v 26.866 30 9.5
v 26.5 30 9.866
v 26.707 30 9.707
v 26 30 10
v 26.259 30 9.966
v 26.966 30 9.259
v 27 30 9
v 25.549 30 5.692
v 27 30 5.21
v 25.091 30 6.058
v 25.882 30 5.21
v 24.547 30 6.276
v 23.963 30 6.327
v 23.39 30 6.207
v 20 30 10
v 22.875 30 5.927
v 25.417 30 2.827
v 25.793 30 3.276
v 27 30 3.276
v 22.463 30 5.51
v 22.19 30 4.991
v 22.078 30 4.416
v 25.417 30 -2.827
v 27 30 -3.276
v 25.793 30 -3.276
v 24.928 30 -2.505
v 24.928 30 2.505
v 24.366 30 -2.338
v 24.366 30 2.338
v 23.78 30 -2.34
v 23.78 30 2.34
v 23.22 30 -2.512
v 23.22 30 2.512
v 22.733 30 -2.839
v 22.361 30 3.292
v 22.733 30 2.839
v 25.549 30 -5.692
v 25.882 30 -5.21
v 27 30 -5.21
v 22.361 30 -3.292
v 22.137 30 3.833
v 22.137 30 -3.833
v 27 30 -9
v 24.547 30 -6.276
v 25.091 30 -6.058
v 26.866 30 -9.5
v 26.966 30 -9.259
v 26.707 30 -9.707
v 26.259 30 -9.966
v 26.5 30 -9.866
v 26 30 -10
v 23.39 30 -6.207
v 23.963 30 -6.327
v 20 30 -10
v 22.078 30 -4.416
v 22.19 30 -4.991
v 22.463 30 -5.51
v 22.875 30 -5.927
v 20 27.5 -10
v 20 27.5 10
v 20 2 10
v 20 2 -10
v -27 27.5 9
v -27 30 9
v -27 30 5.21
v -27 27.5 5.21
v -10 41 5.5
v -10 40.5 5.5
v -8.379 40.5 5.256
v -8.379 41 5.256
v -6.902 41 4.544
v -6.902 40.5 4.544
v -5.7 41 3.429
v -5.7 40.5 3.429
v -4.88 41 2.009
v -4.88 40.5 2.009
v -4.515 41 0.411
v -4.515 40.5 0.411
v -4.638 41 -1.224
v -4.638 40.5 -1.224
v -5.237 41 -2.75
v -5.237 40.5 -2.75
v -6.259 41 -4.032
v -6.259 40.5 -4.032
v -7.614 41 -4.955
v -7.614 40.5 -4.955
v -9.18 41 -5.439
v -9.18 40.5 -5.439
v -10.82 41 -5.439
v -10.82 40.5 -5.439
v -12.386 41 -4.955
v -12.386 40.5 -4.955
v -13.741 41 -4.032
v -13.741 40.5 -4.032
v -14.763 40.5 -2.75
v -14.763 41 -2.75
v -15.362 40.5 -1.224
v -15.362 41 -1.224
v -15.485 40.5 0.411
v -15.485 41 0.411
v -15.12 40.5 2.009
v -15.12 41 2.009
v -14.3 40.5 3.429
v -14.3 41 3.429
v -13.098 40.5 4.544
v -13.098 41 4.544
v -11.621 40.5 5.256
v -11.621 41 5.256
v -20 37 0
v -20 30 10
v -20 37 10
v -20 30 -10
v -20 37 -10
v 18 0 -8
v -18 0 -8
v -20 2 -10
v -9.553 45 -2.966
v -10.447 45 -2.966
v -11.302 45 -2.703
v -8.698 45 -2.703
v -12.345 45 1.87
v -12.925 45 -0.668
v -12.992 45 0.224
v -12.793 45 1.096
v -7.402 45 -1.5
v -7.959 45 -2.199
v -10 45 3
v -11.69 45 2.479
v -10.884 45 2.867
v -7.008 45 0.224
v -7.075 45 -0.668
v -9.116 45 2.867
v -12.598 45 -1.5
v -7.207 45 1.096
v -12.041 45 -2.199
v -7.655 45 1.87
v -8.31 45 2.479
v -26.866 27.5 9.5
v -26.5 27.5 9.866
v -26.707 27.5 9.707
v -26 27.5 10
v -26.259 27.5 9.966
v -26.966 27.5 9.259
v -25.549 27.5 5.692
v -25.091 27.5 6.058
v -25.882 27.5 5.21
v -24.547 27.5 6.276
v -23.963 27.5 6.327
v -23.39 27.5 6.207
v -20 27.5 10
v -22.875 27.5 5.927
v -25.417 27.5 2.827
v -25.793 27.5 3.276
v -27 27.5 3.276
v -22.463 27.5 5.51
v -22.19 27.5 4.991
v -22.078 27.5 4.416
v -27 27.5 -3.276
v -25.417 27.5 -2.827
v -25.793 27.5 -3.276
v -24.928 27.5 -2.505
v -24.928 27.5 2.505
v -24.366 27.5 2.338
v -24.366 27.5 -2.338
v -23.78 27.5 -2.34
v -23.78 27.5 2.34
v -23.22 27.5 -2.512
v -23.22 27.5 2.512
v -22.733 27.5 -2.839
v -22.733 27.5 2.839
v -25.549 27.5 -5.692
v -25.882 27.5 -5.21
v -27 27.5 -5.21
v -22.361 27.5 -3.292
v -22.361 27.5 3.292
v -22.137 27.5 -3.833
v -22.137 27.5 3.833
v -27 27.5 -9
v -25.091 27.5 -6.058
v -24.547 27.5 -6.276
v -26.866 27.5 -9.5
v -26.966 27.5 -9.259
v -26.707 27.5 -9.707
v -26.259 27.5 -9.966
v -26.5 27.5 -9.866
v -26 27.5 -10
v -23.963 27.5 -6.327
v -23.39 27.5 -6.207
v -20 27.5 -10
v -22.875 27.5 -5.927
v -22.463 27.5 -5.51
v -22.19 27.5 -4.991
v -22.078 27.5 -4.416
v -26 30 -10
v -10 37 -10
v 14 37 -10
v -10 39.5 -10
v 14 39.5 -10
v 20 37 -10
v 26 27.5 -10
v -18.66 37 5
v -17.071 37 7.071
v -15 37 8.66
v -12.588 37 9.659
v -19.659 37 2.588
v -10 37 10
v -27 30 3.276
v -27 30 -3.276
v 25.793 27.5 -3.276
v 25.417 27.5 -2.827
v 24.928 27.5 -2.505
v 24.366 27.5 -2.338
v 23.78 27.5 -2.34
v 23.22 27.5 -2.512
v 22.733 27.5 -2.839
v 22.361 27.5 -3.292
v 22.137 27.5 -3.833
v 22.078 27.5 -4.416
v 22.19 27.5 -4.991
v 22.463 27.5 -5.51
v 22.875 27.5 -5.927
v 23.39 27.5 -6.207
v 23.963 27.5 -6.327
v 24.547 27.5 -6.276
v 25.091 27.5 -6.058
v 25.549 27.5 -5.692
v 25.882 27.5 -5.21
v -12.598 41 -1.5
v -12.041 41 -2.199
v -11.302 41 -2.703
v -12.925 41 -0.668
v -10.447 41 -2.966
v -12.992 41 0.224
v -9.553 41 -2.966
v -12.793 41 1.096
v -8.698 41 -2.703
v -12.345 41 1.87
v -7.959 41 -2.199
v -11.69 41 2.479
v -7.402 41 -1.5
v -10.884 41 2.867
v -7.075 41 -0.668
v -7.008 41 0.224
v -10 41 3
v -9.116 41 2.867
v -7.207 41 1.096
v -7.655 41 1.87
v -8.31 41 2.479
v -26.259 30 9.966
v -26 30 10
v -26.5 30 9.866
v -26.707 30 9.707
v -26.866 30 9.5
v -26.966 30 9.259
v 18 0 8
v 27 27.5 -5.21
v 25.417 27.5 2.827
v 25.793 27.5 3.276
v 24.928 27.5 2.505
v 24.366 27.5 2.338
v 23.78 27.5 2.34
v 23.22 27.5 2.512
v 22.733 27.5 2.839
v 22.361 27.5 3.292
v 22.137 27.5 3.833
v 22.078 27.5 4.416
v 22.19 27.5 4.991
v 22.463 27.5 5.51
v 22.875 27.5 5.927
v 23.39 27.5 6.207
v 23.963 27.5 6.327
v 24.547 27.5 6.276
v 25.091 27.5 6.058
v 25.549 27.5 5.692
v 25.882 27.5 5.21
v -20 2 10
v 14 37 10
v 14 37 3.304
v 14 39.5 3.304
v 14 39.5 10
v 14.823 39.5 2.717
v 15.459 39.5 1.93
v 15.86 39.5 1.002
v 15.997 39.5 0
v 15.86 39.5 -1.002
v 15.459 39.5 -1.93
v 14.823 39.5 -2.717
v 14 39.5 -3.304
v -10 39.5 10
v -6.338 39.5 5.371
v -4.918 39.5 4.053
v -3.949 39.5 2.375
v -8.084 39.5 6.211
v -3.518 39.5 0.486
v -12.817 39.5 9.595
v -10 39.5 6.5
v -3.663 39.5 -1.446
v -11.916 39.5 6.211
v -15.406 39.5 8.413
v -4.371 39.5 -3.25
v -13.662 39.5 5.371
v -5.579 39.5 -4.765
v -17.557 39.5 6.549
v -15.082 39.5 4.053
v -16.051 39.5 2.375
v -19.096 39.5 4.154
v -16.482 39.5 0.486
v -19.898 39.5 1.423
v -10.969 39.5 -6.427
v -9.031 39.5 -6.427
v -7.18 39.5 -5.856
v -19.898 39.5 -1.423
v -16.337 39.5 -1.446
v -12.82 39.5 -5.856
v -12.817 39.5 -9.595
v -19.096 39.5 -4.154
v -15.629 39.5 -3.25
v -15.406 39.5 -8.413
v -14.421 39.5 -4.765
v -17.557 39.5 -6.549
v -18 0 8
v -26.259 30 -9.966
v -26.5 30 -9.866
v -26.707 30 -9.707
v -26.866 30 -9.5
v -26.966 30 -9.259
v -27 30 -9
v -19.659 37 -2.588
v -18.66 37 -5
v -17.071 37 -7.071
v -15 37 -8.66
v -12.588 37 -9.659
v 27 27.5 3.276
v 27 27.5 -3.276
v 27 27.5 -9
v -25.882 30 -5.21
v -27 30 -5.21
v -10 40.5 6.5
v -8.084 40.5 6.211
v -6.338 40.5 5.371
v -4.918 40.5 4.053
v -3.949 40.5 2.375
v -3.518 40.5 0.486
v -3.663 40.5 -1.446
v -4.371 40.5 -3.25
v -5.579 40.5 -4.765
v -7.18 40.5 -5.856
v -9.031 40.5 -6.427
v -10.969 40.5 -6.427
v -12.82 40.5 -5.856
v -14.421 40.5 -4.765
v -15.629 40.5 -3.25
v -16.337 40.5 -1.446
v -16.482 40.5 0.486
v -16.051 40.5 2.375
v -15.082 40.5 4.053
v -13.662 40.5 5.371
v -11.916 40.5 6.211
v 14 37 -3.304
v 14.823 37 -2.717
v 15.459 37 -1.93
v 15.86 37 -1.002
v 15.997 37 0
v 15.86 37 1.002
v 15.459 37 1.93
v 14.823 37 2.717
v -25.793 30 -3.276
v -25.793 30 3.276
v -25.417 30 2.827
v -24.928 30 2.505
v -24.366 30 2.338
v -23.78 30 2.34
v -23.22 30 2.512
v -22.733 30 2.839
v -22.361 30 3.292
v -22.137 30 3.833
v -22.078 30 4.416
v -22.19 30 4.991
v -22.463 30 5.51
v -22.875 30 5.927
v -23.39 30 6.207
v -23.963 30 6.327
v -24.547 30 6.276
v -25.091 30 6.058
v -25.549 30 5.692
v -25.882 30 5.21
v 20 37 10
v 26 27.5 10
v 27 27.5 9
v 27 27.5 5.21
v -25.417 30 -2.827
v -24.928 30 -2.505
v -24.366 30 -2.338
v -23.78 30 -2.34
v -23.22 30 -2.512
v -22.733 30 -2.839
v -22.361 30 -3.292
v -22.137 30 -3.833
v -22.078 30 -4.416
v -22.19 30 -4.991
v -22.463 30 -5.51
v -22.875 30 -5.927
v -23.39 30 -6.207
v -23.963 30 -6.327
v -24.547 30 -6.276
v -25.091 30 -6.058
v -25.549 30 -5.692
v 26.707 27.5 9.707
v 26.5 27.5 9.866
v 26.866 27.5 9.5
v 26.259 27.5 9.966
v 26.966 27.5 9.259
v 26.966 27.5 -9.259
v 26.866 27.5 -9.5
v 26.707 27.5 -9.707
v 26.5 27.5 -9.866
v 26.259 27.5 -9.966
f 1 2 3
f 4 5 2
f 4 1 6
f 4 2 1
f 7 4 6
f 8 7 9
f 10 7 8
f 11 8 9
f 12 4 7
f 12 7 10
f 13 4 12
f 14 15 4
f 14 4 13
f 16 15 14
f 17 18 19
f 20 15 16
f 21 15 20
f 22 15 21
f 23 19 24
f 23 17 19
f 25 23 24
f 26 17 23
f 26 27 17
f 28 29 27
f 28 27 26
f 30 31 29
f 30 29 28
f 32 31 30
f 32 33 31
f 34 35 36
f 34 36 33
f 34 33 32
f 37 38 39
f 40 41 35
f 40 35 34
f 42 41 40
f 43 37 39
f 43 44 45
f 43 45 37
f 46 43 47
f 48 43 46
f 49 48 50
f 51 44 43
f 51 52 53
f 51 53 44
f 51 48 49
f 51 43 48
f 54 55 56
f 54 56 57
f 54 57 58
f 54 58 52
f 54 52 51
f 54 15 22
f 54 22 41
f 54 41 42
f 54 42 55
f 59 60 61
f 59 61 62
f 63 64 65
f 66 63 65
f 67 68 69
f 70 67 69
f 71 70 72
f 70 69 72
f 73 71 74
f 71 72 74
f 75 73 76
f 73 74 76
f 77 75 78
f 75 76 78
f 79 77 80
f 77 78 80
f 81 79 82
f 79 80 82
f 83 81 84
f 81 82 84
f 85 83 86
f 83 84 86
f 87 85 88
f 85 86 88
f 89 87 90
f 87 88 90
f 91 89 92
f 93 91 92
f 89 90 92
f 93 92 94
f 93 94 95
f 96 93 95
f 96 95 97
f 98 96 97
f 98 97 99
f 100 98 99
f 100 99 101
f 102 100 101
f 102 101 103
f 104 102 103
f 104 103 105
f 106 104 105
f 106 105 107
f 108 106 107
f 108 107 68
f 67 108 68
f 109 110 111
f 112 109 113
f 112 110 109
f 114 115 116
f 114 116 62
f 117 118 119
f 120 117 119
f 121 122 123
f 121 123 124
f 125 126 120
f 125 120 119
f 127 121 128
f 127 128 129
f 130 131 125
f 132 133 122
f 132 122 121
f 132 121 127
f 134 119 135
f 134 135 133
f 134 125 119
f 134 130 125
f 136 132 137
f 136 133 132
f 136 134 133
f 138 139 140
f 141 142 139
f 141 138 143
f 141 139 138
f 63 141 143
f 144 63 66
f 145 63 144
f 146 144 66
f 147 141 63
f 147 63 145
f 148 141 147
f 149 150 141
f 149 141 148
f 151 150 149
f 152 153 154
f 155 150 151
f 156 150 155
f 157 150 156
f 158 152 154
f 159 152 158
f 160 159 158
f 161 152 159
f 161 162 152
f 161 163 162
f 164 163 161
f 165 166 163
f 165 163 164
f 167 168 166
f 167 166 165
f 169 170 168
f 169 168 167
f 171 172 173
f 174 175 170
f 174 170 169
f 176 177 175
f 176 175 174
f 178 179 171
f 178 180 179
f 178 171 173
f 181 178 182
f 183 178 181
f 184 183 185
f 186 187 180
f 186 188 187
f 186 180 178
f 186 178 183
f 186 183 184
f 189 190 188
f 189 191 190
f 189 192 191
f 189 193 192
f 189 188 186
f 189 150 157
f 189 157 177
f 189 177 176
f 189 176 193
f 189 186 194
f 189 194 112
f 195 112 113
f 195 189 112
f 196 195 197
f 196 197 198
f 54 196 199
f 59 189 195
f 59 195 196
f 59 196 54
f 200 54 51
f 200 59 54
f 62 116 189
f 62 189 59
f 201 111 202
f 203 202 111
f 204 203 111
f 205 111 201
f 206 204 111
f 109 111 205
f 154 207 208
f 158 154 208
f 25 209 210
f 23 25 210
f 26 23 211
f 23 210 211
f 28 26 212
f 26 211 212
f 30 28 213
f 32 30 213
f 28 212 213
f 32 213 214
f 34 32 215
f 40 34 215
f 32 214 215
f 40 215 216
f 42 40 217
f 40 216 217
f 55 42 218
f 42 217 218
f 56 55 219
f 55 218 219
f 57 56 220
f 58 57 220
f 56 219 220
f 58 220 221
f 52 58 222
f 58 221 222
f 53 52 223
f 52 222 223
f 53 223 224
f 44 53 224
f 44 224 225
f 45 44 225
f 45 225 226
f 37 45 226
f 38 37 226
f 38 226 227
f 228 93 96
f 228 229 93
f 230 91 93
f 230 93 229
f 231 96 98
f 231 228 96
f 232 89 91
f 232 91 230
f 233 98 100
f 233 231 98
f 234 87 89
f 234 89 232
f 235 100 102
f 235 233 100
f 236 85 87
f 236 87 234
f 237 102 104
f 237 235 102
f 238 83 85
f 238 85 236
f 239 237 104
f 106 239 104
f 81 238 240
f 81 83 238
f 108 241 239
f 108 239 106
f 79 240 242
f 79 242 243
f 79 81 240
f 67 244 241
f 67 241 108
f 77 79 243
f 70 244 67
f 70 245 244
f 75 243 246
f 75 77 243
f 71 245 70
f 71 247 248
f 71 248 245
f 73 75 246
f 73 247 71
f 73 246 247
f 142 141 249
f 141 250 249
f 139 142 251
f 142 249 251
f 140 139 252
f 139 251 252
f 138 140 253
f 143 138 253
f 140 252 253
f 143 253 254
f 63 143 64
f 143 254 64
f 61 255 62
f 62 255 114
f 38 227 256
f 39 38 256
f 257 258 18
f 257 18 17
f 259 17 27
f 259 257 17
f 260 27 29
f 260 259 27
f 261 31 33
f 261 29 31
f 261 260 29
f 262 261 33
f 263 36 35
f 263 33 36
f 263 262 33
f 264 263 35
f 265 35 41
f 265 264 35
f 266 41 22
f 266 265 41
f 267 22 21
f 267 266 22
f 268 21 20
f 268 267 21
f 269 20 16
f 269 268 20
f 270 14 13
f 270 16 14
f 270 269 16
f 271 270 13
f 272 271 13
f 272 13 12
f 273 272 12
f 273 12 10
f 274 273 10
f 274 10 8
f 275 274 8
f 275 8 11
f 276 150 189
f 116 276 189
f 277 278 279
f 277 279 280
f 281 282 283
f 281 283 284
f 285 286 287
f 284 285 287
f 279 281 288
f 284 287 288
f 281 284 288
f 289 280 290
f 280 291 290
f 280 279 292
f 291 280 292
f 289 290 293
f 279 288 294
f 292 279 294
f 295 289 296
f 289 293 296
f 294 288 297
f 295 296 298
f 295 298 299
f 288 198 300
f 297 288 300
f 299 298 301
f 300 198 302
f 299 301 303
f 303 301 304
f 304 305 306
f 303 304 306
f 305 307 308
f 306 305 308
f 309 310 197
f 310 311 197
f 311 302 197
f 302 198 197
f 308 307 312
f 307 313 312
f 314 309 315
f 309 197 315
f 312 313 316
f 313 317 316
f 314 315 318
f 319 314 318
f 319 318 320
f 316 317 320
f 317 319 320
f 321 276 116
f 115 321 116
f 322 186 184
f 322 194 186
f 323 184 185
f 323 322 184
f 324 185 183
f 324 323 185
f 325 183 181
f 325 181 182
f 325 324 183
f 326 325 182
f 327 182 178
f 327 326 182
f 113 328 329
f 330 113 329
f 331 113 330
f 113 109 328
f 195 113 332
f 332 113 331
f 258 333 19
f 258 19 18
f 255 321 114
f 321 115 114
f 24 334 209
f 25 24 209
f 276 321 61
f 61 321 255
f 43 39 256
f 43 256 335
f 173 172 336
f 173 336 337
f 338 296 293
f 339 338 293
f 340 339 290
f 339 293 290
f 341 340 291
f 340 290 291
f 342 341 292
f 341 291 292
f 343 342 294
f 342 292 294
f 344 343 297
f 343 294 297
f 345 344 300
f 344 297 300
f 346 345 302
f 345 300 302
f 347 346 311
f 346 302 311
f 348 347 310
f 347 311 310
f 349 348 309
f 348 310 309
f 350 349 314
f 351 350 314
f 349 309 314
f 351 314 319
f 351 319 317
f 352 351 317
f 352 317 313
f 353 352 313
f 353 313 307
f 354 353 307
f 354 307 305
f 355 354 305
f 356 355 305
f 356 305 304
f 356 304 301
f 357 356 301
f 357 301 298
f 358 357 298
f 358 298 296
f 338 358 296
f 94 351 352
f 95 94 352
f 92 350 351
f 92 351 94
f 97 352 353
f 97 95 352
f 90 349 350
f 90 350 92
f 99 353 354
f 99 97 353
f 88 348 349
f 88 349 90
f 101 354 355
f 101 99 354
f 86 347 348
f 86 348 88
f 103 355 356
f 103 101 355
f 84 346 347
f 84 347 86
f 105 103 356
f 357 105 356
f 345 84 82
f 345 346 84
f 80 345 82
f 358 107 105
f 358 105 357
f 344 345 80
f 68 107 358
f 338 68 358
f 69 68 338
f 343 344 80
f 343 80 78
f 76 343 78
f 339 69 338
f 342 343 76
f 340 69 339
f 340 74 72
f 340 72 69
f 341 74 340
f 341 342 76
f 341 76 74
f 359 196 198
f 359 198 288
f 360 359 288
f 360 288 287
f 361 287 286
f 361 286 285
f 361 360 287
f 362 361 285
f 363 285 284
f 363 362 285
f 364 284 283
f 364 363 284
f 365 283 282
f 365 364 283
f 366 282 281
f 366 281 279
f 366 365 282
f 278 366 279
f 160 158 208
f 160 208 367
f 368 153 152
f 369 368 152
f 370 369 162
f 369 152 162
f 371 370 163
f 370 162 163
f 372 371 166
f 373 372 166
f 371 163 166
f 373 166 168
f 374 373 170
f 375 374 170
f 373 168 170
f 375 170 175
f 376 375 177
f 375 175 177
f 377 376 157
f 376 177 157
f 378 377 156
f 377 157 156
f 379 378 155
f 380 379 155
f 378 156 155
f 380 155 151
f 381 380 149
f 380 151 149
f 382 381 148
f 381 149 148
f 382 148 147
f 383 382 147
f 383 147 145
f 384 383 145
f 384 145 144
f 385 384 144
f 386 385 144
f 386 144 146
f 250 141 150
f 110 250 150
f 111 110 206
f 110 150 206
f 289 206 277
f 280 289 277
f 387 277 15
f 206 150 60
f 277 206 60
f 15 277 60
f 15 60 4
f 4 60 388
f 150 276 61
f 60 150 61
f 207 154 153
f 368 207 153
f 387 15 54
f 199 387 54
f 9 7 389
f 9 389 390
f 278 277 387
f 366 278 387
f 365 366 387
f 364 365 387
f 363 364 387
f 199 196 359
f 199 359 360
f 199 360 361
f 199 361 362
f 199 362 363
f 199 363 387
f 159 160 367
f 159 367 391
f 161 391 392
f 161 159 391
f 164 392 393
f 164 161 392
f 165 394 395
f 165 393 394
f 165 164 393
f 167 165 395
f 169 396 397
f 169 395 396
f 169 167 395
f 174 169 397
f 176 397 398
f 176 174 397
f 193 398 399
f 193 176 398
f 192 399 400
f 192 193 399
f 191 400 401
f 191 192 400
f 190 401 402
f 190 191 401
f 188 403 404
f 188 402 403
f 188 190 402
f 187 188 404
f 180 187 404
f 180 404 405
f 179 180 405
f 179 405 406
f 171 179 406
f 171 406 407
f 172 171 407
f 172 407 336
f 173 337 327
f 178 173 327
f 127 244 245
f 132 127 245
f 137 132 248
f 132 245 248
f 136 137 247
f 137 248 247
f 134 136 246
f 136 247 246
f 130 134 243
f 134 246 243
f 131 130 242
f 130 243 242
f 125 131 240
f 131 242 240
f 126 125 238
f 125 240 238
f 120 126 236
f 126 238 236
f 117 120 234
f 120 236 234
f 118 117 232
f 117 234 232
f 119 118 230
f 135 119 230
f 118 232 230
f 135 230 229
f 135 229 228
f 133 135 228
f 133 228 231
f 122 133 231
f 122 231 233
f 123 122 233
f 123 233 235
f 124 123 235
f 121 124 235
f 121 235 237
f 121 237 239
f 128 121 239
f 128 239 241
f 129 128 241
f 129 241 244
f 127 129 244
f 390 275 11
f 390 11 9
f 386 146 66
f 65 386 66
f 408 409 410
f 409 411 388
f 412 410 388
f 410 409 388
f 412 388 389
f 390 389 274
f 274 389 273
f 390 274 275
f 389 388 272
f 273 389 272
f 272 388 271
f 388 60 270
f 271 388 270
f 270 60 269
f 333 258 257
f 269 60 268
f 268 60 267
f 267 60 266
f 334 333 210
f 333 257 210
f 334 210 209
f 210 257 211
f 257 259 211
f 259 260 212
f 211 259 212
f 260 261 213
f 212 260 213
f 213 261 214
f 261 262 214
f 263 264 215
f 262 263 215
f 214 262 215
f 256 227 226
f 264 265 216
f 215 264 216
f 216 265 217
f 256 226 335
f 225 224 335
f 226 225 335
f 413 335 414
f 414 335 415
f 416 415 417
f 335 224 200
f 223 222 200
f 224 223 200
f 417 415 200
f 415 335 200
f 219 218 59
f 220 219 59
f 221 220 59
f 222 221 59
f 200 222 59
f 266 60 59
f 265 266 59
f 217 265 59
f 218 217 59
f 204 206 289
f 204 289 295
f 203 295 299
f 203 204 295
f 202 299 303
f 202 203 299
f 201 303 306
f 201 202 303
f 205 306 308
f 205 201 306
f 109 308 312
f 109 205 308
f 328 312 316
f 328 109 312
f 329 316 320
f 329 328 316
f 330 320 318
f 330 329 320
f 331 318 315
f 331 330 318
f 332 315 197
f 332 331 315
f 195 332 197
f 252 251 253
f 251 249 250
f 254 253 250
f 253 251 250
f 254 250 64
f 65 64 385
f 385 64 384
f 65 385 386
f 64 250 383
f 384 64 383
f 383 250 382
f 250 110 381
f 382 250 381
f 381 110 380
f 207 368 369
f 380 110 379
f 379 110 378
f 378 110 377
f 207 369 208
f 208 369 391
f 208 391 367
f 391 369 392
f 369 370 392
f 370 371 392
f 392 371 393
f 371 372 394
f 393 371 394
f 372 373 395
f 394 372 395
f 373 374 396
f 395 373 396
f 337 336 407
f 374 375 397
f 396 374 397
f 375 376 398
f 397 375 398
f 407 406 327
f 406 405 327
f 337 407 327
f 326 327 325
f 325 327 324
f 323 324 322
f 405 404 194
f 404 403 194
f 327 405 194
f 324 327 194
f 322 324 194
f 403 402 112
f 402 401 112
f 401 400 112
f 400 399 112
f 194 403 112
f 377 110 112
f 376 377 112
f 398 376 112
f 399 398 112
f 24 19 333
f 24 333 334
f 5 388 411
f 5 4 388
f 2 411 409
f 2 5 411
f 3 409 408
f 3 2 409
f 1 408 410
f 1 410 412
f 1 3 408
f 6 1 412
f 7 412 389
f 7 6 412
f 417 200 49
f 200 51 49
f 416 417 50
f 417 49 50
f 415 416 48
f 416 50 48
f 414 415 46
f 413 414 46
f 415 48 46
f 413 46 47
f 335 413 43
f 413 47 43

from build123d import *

# Parameters (mm, degrees)
SKETCH_1_W             = 40
SKETCH_1_H             = 20
EXTRUDE_1_DEPTH        = 37
SKETCH_2_W             = 20
SKETCH_2_H             = 2.5
EXTRUDE_2_DEPTH        = 7
FILLET_1_R             = 1
CUT_EXTRUDE_1_DEPTH    = 47
FILLET_1_OF_MIRROR_1_R = 1
EXTRUDE_3_DEPTH        = 2.5
SKETCH_6_R             = 6.5
EXTRUDE_4_DEPTH        = 3.5
SKETCH_7_R             = 5.5
EXTRUDE_5_DEPTH        = 4
SKETCH_8_R             = 3
EXTRUDE_6_DEPTH        = 8
CHAMFER_1_SIZE         = 2


with BuildPart() as part:
    # 草图1 → 凸台-拉伸1 (new body)
    with BuildSketch(Plane(origin=(0, 0, 0), x_dir=(1, 0, 0), z_dir=(0, 1, 0))):
        Rectangle(SKETCH_1_W, SKETCH_1_H)
    extrude(amount=EXTRUDE_1_DEPTH)

    # 草图2 → 凸台-拉伸2 (add)
    with BuildSketch(Plane(origin=(20, 0, 0), x_dir=(0, 0, -1), z_dir=(1, 0, 0))):
        with Locations((0, 28.75)):
            Rectangle(SKETCH_2_W, SKETCH_2_H)
    extrude_2 = extrude(amount=EXTRUDE_2_DEPTH)

    # 圆角1
    fillet_1_edges = [part.edges().sort_by_distance(p)[0] for p in [
        (27, 28.75, -10),
        (27, 28.75, 10),
    ]]
    fillet(fillet_1_edges, radius=FILLET_1_R)

    # 草图3 → 切除-拉伸1 (cut)
    with BuildSketch(Plane(origin=(0, 0, 0), x_dir=(1, 0, 0), z_dir=(0, 1, 0))):
        with BuildLine():
            Line((25.882021082, 5.209730705), (27, 5.209730705))
            Line((27, 5.209730705), (27, 3.27640675))
            Line((27, 3.27640675), (25.792986763, 3.27640675))
            ThreePointArc((25.792986763, 3.27640675), (22.077686149, 4.416217577), (25.882021082, 5.209730705))
        make_face()
        with BuildLine():
            Line((27, -3.27640675), (25.792986763, -3.27640675))
            ThreePointArc((25.792986763, -3.27640675), (22.077686149, -4.416217577), (25.882021082, -5.209730705))
            Line((25.882021082, -5.209730705), (27, -5.209730705))
            Line((27, -5.209730705), (27, -3.27640675))
        make_face()
    cut_extrude_1 = extrude(amount=CUT_EXTRUDE_1_DEPTH, mode=Mode.SUBTRACT)

    # 镜向1: 凸台-拉伸2, 切除-拉伸1 across plane
    add(extrude_2.mirror(Plane(origin=(0, 0, 0), x_dir=(0, 0, 1), z_dir=(1, 0, 0))))
    add(cut_extrude_1.mirror(Plane(origin=(0, 0, 0), x_dir=(0, 0, 1), z_dir=(1, 0, 0))), mode=Mode.SUBTRACT)

    # 圆角1 of 镜向1
    fillet_1_of_mirror_1_edges = [part.edges().sort_by_distance(p)[0] for p in [
        (-27, 28.75, -10),
        (-27, 28.75, 10),
    ]]
    fillet(fillet_1_of_mirror_1_edges, radius=FILLET_1_OF_MIRROR_1_R)

    # 草图4 → 凸台-拉伸3 (add)
    with BuildSketch(Plane(origin=(0, 37, 0), x_dir=(1, 0, 0), z_dir=(0, 1, 0))):
        with BuildLine():
            Line((14, 10), (14, 3.303949568))
            ThreePointArc((14, 3.303949568), (15.996871366, 0), (14, -3.303949568))
            Line((14, -3.303949568), (14, -10))
            Line((14, -10), (-10, -10))
            ThreePointArc((-10, -10), (-20, 0), (-10, 10))
            Line((-10, 10), (14, 10))
        make_face()
    extrude(amount=EXTRUDE_3_DEPTH)

    # 草图6 → 凸台-拉伸4 (add)
    with BuildSketch(Plane(origin=(0, 37, 0), x_dir=(1, 0, 0), z_dir=(0, 1, 0))):
        with Locations(Location((-10, 0, 0), (0, 0, 270))):
            Circle(SKETCH_6_R)
    extrude(amount=EXTRUDE_4_DEPTH)

    # 草图7 → 凸台-拉伸5 (add)
    with BuildSketch(Plane(origin=(0, 37, 0), x_dir=(1, 0, 0), z_dir=(0, 1, 0))):
        with Locations(Location((-10, 0, 0), (0, 0, 270))):
            Circle(SKETCH_7_R)
    extrude(amount=EXTRUDE_5_DEPTH)

    # 草图8 → 凸台-拉伸6 (add)
    with BuildSketch(Plane(origin=(0, 37, 0), x_dir=(1, 0, 0), z_dir=(0, 1, 0))):
        with Locations(Location((-10, 0, 0), (0, 0, 270))):
            Circle(SKETCH_8_R)
    extrude(amount=EXTRUDE_6_DEPTH)

    # 倒角1
    chamfer_1_edges = [part.edges().sort_by_distance(p)[0] for p in [
        (0, 0, 10),
        (-20, 0, 0),
        (0, 0, -10),
        (20, 0, 0),
    ]]
    chamfer(chamfer_1_edges, length=CHAMFER_1_SIZE)


solid = part.part
